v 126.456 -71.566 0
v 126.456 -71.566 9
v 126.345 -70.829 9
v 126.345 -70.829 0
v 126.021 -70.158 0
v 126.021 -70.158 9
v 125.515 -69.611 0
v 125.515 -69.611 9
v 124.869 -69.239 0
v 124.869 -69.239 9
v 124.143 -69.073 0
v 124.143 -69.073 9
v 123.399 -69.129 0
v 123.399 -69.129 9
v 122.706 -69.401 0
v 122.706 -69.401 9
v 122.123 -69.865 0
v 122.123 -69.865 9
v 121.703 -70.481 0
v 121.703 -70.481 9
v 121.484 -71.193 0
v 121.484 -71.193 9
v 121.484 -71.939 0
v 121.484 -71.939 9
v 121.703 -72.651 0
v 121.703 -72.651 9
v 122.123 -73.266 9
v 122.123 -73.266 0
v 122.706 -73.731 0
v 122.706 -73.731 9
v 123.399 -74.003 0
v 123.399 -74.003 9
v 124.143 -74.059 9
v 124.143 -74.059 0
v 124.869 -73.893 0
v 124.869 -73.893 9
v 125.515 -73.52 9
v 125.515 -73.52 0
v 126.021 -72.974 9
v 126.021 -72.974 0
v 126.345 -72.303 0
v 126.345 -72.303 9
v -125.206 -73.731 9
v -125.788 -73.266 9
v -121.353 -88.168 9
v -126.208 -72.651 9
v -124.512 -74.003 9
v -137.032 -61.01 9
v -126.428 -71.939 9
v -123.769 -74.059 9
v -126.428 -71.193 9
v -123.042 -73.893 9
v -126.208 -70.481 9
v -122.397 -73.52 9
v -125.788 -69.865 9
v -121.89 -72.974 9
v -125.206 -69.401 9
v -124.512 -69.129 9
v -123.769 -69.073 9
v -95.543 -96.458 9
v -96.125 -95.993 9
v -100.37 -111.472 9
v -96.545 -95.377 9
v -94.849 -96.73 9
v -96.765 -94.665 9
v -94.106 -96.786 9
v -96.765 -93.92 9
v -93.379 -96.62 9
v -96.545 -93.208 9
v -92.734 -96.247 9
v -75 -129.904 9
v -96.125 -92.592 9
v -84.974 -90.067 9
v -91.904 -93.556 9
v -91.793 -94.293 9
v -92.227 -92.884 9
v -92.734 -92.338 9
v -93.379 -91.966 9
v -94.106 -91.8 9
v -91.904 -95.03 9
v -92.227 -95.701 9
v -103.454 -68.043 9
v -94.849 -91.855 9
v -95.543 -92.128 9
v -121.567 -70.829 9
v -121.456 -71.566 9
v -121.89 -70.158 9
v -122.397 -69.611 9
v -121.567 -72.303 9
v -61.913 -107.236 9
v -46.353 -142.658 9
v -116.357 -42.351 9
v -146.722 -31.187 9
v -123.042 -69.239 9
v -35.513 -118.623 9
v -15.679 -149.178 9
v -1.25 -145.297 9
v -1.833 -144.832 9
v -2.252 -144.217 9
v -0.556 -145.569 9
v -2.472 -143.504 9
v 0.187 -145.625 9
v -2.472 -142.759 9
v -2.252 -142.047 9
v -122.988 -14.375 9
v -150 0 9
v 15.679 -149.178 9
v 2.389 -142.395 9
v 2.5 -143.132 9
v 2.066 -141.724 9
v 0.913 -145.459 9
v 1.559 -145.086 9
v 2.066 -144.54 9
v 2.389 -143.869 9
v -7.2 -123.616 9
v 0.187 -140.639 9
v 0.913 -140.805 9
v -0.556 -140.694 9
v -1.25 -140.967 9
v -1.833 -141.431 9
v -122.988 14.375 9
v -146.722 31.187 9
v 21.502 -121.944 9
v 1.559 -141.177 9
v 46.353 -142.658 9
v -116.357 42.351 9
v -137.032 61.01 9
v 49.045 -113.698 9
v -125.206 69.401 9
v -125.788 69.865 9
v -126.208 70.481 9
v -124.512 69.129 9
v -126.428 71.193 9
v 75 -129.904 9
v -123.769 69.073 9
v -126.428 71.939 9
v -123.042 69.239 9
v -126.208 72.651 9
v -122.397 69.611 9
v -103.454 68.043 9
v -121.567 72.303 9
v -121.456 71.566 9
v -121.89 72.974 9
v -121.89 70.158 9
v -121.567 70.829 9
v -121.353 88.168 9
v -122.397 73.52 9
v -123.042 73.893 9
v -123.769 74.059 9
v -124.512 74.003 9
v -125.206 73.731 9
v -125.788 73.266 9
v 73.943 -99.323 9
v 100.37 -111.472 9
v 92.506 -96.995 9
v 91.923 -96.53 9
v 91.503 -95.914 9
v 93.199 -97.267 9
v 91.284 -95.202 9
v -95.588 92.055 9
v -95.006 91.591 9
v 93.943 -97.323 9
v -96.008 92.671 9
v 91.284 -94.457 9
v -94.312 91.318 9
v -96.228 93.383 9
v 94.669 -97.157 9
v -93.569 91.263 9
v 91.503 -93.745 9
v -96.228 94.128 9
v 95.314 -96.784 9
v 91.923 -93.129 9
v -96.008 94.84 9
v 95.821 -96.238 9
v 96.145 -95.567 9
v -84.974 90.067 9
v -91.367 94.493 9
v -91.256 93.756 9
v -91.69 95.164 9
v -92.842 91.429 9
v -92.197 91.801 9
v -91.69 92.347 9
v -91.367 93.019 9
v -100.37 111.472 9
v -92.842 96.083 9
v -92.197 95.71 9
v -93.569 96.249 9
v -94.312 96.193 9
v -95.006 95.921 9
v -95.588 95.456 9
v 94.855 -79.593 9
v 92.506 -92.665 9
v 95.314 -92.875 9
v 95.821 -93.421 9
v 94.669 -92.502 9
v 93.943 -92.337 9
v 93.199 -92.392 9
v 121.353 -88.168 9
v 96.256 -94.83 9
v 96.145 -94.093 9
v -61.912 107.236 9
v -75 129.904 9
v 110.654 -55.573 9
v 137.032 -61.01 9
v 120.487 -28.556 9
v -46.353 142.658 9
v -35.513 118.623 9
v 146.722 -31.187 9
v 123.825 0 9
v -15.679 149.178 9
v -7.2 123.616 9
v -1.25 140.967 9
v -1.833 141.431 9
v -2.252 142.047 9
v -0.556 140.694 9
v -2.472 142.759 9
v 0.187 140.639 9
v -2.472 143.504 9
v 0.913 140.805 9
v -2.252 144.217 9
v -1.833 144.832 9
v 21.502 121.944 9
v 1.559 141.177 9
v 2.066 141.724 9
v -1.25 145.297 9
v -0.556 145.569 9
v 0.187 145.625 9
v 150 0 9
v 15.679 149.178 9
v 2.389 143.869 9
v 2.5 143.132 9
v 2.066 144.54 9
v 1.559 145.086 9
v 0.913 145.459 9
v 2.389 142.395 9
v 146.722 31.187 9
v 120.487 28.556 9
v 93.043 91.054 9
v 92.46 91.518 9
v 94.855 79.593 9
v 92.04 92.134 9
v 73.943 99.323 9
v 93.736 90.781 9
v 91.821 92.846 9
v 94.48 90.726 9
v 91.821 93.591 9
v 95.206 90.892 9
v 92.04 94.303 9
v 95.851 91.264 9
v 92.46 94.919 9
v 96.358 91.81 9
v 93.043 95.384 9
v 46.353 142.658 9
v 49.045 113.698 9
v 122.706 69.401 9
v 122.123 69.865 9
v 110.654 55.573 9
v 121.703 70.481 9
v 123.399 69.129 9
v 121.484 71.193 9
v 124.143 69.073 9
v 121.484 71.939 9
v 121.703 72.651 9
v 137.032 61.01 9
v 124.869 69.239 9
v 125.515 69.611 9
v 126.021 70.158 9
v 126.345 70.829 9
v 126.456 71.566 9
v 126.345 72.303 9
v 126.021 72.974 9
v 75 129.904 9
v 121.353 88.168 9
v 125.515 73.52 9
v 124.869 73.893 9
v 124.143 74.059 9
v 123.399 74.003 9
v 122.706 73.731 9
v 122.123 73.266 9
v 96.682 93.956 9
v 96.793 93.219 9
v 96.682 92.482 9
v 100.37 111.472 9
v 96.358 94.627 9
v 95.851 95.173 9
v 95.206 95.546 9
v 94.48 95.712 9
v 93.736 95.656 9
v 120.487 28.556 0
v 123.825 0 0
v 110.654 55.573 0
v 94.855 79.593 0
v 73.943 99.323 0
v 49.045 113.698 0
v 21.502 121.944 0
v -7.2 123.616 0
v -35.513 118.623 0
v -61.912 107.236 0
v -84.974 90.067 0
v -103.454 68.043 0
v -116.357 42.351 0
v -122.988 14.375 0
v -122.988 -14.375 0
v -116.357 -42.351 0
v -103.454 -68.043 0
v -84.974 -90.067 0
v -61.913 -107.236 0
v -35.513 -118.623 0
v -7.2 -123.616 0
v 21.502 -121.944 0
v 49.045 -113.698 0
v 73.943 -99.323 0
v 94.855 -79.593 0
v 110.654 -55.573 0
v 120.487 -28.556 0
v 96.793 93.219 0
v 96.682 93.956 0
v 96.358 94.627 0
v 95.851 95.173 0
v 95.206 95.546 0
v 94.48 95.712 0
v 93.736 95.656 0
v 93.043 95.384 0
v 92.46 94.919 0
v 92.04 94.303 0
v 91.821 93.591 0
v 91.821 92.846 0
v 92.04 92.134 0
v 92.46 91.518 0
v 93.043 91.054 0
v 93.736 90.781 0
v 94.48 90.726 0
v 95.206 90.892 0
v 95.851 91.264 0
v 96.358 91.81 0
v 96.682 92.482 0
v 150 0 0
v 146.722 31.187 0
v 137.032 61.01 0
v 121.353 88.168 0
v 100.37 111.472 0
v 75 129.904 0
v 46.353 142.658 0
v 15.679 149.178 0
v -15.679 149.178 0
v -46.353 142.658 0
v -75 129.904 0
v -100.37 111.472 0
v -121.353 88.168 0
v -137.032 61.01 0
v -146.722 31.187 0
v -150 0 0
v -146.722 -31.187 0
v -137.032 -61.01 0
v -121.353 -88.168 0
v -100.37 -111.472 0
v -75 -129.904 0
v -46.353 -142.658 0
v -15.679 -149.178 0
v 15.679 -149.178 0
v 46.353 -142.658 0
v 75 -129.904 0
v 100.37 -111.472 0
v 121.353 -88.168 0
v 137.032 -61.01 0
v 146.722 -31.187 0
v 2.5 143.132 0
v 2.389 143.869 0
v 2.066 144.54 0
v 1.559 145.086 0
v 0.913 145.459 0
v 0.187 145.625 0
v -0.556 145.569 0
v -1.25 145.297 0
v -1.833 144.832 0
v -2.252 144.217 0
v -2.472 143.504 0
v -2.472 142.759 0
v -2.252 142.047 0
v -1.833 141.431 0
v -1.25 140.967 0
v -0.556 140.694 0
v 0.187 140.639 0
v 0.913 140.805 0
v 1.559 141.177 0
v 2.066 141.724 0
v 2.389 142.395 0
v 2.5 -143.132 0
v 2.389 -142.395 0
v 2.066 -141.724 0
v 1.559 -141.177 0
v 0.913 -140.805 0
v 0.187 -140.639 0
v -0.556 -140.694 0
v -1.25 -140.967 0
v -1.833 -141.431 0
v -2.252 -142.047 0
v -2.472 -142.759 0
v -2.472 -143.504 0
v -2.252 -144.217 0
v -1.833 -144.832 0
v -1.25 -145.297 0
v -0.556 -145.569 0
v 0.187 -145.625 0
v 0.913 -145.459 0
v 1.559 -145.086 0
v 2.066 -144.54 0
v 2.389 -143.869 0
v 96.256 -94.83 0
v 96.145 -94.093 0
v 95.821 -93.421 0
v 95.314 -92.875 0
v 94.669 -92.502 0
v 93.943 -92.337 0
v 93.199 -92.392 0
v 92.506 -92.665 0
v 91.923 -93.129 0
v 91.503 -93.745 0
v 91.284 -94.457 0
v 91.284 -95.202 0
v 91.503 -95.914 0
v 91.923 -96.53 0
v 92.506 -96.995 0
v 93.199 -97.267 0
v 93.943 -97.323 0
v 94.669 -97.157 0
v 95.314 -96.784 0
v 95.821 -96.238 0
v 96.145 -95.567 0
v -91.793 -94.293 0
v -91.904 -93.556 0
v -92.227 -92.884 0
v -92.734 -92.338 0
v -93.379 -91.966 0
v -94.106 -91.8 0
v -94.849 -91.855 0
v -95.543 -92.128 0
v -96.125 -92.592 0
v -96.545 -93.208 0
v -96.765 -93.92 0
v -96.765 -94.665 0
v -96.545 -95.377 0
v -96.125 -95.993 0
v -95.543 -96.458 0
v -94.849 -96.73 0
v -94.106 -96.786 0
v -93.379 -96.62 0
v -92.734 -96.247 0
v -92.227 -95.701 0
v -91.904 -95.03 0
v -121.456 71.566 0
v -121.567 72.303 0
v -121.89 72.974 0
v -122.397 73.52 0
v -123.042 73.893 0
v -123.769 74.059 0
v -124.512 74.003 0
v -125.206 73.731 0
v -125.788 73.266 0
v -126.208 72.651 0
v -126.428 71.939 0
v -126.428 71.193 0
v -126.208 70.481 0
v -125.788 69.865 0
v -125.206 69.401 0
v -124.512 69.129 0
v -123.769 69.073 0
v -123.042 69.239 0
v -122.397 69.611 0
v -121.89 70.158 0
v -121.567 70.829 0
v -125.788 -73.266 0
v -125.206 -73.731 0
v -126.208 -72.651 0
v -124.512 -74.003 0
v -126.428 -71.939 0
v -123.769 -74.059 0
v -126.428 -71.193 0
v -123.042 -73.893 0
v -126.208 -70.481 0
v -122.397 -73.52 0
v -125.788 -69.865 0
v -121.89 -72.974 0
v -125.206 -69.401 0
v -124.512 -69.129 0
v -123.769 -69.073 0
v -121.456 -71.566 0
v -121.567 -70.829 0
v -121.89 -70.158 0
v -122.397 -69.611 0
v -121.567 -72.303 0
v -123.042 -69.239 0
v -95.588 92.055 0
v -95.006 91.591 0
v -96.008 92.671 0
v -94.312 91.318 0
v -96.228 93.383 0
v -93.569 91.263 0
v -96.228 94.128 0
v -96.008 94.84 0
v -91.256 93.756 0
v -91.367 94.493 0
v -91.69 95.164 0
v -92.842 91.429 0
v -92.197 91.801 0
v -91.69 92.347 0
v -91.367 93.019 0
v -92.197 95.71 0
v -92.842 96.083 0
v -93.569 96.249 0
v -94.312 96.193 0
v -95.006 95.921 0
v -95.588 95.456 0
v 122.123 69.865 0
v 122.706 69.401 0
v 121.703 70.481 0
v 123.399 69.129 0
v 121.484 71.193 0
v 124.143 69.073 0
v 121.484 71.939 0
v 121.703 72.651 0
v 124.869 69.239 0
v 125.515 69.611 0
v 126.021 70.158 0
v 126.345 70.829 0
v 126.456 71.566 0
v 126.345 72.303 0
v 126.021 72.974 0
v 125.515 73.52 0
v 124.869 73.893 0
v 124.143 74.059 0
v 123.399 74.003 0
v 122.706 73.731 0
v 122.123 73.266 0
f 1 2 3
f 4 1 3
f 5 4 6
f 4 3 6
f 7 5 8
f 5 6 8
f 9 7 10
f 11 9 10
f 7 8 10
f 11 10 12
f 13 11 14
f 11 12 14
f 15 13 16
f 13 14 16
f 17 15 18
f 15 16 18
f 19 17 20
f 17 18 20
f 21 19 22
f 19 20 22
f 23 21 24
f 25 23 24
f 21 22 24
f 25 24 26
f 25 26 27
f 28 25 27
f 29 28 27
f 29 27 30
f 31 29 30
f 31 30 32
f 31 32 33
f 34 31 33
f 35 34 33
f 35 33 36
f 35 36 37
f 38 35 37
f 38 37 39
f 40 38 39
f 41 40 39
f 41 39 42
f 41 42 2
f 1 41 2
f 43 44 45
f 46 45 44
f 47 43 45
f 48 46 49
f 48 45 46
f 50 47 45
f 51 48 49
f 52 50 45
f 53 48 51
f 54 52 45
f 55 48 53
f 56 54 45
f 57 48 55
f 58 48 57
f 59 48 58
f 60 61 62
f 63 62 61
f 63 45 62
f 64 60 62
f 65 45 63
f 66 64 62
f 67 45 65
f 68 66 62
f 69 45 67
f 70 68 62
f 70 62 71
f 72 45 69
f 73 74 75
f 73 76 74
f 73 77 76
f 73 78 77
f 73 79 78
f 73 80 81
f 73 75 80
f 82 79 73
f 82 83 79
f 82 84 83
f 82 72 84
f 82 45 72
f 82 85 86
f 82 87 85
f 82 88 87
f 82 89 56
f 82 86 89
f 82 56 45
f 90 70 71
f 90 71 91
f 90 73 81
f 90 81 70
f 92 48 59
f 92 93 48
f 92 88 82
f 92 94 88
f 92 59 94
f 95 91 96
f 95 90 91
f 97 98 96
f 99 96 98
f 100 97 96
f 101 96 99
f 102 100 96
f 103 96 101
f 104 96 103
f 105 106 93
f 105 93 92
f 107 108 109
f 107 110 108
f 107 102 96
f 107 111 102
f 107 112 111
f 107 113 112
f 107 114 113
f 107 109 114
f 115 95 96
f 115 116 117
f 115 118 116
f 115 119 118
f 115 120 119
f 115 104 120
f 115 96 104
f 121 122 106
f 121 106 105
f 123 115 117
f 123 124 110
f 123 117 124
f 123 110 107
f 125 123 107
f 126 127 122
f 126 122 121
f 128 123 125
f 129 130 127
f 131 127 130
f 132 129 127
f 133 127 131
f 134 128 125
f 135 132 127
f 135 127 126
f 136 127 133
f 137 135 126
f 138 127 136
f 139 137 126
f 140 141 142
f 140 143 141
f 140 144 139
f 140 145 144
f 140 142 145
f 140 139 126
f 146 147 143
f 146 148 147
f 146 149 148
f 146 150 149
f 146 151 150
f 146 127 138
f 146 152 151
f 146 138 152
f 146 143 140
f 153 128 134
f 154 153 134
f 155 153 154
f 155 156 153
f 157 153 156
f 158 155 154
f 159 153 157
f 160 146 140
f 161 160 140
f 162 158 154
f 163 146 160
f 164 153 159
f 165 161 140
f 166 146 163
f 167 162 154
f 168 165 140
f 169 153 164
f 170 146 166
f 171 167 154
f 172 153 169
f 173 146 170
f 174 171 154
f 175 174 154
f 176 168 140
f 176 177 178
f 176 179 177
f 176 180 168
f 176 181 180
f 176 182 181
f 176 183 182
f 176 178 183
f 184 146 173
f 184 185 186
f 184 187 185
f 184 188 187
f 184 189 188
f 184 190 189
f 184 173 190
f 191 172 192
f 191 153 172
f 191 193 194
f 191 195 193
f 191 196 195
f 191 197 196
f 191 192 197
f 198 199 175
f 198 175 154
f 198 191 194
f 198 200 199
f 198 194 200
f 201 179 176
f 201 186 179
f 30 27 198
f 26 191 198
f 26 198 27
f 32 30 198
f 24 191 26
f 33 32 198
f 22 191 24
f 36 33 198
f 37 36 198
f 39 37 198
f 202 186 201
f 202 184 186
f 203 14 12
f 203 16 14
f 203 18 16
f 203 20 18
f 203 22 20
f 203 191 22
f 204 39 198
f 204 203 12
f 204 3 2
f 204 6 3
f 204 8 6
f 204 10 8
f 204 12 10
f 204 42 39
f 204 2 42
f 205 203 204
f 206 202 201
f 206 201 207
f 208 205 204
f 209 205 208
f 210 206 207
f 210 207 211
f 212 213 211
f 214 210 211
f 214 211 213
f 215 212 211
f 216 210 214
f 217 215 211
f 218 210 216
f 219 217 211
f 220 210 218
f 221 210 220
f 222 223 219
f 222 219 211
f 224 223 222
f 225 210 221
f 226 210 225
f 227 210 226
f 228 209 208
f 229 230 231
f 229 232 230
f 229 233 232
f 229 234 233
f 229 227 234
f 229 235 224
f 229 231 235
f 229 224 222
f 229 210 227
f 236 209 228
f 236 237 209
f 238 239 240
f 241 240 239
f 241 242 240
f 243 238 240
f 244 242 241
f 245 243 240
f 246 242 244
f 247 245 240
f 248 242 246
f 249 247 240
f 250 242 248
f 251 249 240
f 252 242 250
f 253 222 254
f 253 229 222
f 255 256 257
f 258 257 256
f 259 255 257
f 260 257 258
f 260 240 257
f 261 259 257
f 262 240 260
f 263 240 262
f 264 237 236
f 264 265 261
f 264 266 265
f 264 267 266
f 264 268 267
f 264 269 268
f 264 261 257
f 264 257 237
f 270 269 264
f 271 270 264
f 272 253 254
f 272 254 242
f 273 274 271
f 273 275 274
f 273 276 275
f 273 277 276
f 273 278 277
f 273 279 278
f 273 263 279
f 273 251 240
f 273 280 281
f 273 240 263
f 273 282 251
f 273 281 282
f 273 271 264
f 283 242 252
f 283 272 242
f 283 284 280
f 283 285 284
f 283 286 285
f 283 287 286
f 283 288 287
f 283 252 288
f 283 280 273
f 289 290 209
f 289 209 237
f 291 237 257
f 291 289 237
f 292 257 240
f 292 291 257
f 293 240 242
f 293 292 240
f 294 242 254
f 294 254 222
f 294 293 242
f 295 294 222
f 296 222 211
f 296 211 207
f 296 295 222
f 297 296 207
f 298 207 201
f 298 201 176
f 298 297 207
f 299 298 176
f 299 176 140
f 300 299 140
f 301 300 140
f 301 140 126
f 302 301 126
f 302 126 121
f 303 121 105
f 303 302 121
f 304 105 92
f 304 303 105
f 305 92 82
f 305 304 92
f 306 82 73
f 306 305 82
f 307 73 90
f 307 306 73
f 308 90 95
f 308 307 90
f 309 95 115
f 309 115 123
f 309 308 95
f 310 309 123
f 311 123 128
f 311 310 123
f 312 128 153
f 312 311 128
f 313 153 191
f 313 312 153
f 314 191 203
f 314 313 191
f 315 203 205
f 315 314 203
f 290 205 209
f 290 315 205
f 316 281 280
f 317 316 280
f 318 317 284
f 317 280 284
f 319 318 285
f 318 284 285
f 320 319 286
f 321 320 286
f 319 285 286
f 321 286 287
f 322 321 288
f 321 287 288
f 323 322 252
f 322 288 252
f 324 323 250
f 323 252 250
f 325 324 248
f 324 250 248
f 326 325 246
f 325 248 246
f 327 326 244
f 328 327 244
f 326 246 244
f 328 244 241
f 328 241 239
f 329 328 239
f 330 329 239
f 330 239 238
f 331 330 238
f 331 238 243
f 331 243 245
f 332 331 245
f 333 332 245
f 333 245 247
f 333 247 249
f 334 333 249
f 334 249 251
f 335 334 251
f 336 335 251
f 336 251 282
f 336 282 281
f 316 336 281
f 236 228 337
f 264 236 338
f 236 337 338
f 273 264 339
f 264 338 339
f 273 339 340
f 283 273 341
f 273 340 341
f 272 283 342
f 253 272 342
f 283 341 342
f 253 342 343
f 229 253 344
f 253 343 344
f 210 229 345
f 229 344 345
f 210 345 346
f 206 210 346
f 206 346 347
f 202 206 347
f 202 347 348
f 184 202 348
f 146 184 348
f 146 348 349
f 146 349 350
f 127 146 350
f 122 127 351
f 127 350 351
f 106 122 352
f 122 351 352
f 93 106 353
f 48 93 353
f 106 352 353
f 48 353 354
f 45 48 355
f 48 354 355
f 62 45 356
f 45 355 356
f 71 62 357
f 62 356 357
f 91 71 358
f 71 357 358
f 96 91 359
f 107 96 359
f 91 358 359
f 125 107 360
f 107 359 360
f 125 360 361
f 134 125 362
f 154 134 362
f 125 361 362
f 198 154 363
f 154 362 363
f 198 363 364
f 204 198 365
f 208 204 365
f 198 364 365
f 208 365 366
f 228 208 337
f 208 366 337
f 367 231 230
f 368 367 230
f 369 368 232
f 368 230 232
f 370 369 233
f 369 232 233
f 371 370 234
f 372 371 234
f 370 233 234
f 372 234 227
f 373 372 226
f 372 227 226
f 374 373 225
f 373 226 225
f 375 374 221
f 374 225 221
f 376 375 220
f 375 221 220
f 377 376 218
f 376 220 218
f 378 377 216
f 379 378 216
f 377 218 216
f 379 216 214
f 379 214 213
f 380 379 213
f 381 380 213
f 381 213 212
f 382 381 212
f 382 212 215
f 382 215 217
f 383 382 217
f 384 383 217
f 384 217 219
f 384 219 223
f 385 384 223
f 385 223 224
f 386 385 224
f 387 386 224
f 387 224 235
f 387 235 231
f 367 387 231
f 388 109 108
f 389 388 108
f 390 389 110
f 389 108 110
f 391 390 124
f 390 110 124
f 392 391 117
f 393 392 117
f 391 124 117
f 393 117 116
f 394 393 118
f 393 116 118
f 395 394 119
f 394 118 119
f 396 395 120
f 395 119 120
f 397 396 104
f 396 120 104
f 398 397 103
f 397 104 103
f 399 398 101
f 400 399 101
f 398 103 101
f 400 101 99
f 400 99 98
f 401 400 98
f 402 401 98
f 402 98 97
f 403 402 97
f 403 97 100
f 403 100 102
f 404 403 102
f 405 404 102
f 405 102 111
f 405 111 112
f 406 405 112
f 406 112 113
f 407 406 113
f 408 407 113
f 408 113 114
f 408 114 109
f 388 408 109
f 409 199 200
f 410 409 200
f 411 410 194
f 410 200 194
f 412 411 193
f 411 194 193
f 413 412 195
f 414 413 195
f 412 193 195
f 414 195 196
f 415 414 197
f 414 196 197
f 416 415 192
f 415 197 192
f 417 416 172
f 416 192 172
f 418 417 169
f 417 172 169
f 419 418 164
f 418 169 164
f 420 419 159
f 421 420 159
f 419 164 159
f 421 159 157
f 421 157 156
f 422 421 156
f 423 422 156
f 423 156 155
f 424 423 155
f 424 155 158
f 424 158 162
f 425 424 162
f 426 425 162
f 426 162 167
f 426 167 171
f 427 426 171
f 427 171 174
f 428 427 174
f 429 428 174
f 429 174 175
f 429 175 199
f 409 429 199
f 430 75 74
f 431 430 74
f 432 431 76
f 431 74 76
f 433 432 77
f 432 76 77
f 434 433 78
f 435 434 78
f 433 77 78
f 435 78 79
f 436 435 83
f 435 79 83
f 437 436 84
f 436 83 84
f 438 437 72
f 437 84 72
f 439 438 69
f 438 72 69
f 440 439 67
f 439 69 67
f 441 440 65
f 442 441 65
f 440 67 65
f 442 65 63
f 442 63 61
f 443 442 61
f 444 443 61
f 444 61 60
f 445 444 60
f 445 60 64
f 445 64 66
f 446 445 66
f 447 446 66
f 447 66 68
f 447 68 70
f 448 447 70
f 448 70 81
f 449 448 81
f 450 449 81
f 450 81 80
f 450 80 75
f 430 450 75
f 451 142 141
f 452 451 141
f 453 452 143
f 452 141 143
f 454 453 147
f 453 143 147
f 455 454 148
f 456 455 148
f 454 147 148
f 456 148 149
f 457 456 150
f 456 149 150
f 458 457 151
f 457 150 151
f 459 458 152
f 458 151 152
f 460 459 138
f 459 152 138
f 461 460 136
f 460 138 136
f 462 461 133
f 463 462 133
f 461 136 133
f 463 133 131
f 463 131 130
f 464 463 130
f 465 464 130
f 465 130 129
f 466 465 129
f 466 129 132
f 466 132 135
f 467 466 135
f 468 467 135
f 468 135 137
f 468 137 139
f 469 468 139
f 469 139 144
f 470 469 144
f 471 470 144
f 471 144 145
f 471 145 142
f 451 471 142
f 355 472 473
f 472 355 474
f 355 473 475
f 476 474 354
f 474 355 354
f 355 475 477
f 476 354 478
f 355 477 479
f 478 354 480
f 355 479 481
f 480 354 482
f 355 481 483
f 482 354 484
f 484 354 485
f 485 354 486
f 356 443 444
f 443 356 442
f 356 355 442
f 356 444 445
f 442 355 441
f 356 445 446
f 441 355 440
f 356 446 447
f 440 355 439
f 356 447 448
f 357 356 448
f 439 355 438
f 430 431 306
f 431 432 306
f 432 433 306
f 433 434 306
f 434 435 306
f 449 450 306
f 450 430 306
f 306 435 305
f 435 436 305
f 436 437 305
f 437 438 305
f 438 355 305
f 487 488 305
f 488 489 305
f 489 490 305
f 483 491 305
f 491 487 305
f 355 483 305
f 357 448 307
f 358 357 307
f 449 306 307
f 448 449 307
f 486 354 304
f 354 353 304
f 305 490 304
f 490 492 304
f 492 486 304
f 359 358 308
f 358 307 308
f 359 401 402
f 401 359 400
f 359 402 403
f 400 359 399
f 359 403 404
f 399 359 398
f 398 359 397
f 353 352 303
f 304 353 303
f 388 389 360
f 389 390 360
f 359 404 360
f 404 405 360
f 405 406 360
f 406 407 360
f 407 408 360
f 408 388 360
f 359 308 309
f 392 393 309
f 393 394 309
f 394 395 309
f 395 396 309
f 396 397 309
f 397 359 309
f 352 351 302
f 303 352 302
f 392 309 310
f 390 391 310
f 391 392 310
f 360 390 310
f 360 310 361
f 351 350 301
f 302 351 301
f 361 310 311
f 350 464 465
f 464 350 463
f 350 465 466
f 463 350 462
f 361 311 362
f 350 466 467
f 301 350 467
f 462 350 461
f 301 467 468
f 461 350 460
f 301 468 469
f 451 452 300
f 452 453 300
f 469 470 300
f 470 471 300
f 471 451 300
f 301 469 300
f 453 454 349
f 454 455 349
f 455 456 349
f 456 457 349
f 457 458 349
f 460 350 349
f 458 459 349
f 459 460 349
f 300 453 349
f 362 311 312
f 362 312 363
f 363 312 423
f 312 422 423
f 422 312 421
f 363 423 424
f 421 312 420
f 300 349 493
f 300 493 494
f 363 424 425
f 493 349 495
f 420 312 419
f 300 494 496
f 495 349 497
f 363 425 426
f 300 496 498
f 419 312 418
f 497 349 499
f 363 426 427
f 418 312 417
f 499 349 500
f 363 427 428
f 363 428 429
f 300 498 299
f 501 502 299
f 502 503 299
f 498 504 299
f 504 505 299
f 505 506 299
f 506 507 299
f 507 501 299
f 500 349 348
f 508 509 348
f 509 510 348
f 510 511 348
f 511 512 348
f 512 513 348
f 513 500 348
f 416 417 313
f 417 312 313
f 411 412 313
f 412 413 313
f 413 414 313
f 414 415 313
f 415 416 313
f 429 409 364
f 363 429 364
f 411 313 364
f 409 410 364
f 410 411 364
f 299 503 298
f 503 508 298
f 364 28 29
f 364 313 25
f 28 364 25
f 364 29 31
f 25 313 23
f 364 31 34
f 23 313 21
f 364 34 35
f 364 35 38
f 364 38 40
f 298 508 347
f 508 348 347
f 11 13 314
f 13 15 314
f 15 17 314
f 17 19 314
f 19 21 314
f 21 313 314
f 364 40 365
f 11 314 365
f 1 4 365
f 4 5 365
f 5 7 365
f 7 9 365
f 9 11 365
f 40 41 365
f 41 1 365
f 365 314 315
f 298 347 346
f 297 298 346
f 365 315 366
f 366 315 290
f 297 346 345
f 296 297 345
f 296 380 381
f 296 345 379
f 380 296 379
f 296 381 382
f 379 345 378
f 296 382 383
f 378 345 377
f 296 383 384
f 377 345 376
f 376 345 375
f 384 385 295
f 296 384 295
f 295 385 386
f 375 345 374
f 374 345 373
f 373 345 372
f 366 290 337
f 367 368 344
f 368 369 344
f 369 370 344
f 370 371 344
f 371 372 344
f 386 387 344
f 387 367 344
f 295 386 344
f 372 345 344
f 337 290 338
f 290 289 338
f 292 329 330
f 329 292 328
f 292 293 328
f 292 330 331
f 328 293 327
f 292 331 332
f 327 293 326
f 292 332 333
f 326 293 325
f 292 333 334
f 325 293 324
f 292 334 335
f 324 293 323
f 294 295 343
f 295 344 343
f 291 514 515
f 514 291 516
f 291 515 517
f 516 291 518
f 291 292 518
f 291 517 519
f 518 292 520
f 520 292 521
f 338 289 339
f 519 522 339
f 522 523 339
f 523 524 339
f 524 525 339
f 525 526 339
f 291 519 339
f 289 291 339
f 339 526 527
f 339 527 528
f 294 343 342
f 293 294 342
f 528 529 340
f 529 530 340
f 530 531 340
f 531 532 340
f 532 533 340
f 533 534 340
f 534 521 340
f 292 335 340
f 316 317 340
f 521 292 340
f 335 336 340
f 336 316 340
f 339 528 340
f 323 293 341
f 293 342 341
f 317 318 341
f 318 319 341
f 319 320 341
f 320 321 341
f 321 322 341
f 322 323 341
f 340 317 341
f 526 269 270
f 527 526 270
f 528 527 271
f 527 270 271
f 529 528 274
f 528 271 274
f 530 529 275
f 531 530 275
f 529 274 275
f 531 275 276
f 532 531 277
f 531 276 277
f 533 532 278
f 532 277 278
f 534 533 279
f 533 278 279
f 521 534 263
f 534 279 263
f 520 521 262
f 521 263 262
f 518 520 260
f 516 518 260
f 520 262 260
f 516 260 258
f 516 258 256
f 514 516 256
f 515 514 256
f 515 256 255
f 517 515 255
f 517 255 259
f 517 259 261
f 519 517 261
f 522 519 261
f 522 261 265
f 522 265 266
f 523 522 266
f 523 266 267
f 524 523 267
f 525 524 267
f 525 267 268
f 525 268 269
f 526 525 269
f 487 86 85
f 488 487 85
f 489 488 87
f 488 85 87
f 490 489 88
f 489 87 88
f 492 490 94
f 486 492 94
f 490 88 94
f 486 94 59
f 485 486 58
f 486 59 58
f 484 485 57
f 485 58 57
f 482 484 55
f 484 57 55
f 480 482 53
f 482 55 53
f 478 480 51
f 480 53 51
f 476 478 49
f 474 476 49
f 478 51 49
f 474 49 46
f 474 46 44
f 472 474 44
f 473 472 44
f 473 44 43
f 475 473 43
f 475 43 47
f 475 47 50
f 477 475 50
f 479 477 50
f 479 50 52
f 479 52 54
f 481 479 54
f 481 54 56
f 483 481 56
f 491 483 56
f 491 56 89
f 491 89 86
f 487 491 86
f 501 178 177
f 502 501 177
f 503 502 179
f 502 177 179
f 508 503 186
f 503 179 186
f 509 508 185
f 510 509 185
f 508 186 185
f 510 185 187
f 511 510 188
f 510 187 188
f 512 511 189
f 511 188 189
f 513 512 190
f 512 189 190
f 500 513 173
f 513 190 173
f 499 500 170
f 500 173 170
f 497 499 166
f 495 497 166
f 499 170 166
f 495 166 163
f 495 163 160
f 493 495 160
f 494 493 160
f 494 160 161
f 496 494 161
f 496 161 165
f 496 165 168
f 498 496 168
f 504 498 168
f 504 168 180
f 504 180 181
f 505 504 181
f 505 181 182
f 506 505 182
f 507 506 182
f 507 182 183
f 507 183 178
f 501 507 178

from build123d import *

# Parameters (mm, degrees)
F0_R     = 150
F0_R_2   = 123.825
F1_DEPTH = 9
F2_R     = 2.5
F3_DEPTH = 25.4


with BuildPart() as f1:
    # F0 (on Top) → F1 (new body)
    with BuildSketch(Plane.XY):
        Circle(F0_R)
        Circle(F0_R_2, mode=Mode.SUBTRACT)
    extrude(amount=F1_DEPTH)

    # F2 (on face) → F3 (cut)
    with BuildSketch(Plane.XY.offset(9)):
        with Locations((-94.292689, -94.292689)):
            Circle(F2_R)
        with Locations((93.755721, -94.829657)):
            Circle(F2_R)
        with Locations((94.292689, 93.218753)):
            Circle(F2_R)
        with Locations((-93.755721, 93.755721)):
            Circle(F2_R)
        with Locations((0, 143.131807)):
            Circle(F2_R)
        with Locations((123.955781, 71.565904)):
            Circle(F2_R)
        with Locations((123.955781, -71.565904)):
            Circle(F2_R)
        with Locations((0, -143.131807)):
            Circle(F2_R)
        with Locations((-123.955782, -71.565903)):
            Circle(F2_R)
        with Locations((-123.955781, 71.565904)):
            Circle(F2_R)
    extrude(amount=-F3_DEPTH, mode=Mode.SUBTRACT)


solid = f1.part
